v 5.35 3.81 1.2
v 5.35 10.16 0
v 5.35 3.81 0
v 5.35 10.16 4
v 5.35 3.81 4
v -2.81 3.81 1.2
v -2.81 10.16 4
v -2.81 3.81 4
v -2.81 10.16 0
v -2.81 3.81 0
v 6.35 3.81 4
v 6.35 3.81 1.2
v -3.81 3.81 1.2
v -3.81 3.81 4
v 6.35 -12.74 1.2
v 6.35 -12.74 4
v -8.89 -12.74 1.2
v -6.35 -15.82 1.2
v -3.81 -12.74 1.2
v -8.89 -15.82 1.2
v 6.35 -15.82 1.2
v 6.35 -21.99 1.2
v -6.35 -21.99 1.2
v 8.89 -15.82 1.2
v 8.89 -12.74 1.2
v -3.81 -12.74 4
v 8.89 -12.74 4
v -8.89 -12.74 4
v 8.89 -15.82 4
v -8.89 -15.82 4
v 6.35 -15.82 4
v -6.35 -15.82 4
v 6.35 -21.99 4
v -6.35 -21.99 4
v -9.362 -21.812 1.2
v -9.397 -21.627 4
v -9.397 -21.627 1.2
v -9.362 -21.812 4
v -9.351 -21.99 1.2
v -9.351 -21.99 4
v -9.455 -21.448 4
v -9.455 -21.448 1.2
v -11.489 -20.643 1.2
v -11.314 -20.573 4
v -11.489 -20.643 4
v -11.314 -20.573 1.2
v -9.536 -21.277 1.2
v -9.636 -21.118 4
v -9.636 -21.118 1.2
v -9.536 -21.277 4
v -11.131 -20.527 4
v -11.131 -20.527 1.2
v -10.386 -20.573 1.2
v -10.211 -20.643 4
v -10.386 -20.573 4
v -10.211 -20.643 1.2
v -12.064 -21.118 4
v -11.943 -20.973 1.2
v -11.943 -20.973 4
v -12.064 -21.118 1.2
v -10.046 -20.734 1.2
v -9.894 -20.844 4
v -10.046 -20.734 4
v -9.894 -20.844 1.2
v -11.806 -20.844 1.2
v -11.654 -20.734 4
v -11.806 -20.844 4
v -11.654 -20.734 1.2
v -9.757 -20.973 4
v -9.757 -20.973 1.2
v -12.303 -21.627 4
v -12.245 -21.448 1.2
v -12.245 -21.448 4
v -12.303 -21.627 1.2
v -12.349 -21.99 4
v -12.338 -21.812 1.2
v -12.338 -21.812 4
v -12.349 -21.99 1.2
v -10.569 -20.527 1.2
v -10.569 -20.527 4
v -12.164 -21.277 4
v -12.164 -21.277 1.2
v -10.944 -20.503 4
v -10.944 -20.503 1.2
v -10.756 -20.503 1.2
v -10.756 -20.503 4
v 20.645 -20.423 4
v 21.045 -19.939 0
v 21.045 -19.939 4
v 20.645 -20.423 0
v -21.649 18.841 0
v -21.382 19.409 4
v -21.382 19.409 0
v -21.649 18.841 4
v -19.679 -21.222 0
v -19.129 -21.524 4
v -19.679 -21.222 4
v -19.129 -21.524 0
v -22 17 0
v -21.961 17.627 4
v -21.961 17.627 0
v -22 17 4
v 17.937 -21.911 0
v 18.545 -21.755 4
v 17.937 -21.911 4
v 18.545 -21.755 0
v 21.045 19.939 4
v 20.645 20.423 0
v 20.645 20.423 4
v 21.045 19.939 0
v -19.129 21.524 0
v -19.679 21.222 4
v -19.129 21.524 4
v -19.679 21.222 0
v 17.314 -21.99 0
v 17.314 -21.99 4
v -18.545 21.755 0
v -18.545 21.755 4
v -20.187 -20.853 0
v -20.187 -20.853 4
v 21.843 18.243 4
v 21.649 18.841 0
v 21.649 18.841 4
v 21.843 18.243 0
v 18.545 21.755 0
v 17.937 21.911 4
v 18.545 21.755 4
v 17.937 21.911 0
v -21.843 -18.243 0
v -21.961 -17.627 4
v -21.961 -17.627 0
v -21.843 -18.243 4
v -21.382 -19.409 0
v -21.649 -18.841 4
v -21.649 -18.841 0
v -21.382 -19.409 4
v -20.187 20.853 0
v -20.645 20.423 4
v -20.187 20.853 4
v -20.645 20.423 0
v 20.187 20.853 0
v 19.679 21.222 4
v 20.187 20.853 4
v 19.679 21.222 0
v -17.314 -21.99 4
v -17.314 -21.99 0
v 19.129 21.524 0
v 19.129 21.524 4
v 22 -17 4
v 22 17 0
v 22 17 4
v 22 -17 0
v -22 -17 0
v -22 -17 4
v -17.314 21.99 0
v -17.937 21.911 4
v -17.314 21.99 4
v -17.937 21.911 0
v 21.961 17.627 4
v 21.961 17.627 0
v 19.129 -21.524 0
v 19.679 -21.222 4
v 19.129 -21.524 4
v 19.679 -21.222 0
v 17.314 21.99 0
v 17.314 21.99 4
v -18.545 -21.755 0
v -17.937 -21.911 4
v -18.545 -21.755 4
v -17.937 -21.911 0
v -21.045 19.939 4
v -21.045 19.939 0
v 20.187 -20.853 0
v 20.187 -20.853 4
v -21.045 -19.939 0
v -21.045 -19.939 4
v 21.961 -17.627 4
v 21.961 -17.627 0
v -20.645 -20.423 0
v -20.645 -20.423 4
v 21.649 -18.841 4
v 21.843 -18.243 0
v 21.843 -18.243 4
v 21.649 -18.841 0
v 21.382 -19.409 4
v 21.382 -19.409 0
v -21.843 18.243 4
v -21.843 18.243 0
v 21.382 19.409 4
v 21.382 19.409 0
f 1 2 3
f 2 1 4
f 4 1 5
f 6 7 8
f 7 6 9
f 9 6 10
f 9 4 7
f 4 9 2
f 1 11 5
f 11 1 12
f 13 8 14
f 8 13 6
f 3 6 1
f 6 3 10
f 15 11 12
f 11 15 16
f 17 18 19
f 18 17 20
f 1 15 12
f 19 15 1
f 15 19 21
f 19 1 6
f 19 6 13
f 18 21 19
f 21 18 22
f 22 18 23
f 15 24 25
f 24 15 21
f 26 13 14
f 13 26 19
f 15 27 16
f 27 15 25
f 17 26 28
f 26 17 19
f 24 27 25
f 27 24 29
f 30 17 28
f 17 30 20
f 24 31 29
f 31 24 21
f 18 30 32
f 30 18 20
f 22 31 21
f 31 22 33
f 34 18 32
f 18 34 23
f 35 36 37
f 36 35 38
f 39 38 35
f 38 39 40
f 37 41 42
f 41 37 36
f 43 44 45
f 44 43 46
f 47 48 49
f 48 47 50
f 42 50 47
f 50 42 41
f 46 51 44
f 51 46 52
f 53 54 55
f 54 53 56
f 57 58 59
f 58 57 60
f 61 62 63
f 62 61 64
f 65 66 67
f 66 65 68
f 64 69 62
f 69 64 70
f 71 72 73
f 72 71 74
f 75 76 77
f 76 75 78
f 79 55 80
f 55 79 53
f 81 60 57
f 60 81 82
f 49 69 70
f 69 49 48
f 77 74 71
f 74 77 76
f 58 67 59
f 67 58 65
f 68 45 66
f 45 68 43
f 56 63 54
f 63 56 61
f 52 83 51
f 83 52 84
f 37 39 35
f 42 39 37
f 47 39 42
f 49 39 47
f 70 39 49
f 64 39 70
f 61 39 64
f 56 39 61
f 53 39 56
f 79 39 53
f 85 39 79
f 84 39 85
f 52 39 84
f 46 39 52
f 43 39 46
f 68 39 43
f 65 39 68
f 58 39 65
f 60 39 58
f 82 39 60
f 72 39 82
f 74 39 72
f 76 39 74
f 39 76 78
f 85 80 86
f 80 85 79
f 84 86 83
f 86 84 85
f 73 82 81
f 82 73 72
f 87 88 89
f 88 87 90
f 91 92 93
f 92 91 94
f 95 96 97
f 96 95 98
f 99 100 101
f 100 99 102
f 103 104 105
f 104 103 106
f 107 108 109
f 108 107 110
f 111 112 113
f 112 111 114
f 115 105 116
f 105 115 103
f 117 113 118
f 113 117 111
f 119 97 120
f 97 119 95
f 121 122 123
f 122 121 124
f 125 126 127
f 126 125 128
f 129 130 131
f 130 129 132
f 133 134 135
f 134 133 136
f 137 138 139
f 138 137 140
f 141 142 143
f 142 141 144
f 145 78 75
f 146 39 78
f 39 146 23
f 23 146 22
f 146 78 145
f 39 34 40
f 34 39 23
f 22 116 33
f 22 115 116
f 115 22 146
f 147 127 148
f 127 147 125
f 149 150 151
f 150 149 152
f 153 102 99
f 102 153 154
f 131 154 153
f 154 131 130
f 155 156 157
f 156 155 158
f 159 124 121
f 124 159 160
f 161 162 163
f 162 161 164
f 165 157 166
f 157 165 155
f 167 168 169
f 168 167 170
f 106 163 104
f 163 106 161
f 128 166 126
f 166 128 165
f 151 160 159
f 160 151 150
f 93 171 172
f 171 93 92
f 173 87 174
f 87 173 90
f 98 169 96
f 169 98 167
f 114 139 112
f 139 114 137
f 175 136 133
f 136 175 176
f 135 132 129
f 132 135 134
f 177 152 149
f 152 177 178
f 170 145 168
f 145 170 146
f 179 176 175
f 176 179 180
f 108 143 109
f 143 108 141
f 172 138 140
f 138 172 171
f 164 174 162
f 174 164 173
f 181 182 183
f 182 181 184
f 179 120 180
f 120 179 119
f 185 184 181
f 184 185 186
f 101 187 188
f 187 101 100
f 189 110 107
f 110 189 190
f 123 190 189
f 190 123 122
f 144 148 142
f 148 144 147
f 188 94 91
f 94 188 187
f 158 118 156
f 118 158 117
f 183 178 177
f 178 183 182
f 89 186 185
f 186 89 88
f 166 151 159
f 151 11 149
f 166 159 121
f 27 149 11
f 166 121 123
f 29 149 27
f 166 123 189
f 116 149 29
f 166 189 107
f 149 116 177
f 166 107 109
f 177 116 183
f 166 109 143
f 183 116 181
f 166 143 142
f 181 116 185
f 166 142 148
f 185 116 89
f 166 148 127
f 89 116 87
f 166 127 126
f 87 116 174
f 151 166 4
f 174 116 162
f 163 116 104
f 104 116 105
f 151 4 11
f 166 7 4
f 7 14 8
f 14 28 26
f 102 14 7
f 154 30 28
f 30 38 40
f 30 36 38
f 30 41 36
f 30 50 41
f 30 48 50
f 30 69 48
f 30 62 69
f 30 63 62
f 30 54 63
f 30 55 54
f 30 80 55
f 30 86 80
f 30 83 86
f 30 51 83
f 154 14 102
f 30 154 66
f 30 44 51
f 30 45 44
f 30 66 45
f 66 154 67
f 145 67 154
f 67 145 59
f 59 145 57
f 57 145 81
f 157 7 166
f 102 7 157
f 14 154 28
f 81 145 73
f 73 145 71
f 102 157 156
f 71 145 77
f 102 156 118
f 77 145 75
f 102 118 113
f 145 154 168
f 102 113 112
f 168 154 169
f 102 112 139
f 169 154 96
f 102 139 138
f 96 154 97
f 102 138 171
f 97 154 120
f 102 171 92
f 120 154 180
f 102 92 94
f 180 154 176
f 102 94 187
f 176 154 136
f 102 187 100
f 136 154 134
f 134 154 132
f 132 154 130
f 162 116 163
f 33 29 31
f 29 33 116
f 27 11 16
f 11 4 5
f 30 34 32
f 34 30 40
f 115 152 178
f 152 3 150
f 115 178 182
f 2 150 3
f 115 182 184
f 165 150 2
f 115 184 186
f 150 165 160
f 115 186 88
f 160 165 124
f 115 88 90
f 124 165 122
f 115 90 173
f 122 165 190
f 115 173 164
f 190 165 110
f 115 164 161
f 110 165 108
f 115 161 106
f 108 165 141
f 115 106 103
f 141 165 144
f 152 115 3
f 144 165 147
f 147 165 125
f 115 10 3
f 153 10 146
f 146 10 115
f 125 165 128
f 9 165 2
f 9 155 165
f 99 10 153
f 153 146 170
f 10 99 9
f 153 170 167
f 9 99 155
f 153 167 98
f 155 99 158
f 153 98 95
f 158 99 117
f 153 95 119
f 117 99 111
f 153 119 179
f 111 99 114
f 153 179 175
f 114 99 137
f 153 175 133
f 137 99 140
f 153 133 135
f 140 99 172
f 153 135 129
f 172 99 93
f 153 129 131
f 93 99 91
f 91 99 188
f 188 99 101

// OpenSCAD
$fn = 50;

difference() {
	union() {
		translate(v = [0, 0, 0]) {
			rotate(a = [0, 0, 0]) {
				difference() {
					union() {
						hull() {
							translate(v = [-17.0, 17.0, 0]) {
								cylinder(h = 4, r = 5);
							}
							translate(v = [17.0, 17.0, 0]) {
								cylinder(h = 4, r = 5);
							}
							translate(v = [-17.0, -17.0, 0]) {
								cylinder(h = 4, r = 5);
							}
							translate(v = [17.0, -17.0, 0]) {
								cylinder(h = 4, r = 5);
							}
						}
					}
					union() {
						translate(v = [-2.81, 3.8100000000000005, -1]) {
							cube(size = [8.16, 6.35, 6]);
						}
						translate(v = [-3.81, -12.74, 1.2000000000000002]) {
							cube(size = [10.16, 16.55, 3.8]);
						}
						translate(v = [-8.89, -15.82, 1.2000000000000002]) {
							cube(size = [17.78, 3.08, 3.8]);
						}
						translate(v = [-6.35, -35.82, 1.2000000000000002]) {
							cube(size = [12.7, 20, 3.8]);
						}
						translate(v = [-10.85, -22.0, 1.2000000000000002]) {
							cylinder(h = 3.8, r = 1.5);
						}
					}
				}
			}
		}
	}
	union();
}
